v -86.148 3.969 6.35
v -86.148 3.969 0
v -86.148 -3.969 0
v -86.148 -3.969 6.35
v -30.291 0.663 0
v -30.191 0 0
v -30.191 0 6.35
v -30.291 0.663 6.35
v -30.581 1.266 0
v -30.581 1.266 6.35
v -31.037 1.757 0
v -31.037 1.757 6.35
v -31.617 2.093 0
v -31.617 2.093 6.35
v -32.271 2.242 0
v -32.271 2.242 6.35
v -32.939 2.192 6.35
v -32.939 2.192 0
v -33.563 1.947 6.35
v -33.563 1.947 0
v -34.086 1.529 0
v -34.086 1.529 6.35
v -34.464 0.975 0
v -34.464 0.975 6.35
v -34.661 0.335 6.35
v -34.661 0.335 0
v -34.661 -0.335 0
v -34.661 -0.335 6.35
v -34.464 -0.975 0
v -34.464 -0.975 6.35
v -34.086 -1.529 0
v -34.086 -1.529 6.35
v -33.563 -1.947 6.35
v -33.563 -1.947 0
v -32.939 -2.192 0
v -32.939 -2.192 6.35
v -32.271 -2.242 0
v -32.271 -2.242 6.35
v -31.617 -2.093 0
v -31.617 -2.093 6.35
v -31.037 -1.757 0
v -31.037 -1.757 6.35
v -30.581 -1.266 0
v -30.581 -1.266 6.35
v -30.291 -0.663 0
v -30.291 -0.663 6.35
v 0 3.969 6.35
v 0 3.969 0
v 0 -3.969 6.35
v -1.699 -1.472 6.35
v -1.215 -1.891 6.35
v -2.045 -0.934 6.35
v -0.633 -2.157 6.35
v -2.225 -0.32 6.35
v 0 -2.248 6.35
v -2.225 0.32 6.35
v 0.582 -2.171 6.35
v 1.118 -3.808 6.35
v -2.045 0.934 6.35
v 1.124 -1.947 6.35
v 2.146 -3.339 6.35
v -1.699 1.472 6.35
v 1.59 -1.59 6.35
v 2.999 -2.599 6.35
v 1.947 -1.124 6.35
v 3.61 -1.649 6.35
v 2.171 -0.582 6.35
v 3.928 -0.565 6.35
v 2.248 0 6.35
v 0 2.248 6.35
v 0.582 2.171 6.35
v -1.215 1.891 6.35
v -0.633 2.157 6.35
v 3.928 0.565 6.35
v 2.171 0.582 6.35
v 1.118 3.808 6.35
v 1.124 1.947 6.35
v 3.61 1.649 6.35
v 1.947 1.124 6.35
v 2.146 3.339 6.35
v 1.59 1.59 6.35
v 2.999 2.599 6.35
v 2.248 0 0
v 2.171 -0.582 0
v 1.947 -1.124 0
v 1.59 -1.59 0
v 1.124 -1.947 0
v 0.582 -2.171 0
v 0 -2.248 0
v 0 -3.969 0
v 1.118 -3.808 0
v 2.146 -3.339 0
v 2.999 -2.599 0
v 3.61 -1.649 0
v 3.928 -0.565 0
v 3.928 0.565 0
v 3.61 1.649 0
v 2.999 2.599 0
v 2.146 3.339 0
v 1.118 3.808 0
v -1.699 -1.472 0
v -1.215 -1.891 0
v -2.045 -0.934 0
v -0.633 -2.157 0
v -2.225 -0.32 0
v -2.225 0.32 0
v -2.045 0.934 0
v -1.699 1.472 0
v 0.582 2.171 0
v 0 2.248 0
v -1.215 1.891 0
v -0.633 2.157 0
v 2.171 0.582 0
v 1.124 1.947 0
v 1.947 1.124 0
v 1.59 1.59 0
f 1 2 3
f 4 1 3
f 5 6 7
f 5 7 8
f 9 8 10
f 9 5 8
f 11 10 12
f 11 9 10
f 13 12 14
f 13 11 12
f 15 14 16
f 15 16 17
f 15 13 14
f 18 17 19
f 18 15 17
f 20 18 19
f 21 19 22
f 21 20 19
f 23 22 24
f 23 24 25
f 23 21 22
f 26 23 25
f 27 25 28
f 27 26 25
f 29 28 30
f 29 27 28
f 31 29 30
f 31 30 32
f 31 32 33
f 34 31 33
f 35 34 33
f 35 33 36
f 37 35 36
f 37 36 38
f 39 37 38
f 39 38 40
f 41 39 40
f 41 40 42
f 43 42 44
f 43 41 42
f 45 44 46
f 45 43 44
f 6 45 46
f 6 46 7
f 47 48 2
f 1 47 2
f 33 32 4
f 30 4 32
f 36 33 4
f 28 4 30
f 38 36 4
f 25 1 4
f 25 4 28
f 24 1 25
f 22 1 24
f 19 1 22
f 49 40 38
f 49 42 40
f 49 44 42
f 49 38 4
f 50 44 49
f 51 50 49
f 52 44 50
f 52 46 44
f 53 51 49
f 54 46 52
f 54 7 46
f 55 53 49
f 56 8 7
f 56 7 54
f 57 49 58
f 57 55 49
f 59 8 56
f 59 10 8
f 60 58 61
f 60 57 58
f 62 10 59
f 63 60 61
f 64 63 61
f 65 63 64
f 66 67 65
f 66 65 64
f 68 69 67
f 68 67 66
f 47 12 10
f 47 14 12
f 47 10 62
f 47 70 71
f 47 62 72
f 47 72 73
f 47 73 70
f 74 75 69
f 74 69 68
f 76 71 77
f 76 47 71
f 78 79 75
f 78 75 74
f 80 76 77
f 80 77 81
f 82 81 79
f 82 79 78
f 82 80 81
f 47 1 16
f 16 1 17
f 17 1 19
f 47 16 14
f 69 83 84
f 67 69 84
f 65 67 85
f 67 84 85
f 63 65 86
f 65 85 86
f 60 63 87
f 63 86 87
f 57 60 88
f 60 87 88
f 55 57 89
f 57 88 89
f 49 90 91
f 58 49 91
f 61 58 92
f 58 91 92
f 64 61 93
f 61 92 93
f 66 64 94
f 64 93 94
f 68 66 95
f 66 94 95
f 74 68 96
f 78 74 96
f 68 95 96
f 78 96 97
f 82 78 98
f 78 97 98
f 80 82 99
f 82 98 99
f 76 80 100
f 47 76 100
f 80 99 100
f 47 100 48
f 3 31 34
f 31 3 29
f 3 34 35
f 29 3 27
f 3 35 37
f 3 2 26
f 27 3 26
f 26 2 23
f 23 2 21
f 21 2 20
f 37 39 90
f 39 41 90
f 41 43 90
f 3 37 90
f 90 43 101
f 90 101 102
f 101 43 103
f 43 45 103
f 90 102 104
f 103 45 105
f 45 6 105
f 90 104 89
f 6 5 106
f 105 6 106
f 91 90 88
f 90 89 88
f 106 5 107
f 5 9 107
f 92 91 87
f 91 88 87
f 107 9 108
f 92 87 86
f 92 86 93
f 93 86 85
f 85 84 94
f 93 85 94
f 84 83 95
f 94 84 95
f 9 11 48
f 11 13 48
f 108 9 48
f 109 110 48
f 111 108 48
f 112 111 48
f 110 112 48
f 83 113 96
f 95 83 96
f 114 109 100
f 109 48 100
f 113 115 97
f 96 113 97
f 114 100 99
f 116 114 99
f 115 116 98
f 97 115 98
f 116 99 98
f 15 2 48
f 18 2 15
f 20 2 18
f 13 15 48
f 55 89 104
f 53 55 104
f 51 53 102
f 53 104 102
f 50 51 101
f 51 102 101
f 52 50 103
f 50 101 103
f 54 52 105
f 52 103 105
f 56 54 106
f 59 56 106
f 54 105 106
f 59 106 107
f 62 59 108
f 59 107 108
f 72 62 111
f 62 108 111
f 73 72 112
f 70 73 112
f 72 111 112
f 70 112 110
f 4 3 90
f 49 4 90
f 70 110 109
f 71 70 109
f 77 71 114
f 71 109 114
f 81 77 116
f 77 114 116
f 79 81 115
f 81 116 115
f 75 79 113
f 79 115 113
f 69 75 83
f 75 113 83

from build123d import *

# Parameters (mm, degrees)
F0_R     = 2.2479
F1_DEPTH = 6.35


with BuildPart() as f1:
    # F0 (on Top) → F1 (new body)
    with BuildSketch(Plane.XY):
        with BuildLine():
            ThreePointArc((0, 2.2479), (1.589505, 1.589505), (2.2479, 0))
            ThreePointArc((2.2479, 0), (1.589505, -1.589505), (0, -2.2479))
            Line((0, -2.2479), (0, -3.96875))
            ThreePointArc((0, -3.96875), (3.96875, 0), (0, 3.96875))
            Line((0, 3.96875), (0, 2.2479))
        make_face()
        with BuildLine():
            ThreePointArc((0, -2.2479), (-2.2479, 0), (0, 2.2479))
            Line((0, 2.2479), (0, 3.96875))
            Line((0, 3.96875), (-86.148189, 3.96875))
            Line((-86.148189, 3.96875), (-86.148189, -3.96875))
            Line((-86.148189, -3.96875), (0, -3.96875))
            Line((0, -3.96875), (0, -2.2479))
        make_face()
        with Locations((-32.438553, 0)):
            Circle(F0_R, mode=Mode.SUBTRACT)
    extrude(amount=F1_DEPTH)


solid = f1.part
